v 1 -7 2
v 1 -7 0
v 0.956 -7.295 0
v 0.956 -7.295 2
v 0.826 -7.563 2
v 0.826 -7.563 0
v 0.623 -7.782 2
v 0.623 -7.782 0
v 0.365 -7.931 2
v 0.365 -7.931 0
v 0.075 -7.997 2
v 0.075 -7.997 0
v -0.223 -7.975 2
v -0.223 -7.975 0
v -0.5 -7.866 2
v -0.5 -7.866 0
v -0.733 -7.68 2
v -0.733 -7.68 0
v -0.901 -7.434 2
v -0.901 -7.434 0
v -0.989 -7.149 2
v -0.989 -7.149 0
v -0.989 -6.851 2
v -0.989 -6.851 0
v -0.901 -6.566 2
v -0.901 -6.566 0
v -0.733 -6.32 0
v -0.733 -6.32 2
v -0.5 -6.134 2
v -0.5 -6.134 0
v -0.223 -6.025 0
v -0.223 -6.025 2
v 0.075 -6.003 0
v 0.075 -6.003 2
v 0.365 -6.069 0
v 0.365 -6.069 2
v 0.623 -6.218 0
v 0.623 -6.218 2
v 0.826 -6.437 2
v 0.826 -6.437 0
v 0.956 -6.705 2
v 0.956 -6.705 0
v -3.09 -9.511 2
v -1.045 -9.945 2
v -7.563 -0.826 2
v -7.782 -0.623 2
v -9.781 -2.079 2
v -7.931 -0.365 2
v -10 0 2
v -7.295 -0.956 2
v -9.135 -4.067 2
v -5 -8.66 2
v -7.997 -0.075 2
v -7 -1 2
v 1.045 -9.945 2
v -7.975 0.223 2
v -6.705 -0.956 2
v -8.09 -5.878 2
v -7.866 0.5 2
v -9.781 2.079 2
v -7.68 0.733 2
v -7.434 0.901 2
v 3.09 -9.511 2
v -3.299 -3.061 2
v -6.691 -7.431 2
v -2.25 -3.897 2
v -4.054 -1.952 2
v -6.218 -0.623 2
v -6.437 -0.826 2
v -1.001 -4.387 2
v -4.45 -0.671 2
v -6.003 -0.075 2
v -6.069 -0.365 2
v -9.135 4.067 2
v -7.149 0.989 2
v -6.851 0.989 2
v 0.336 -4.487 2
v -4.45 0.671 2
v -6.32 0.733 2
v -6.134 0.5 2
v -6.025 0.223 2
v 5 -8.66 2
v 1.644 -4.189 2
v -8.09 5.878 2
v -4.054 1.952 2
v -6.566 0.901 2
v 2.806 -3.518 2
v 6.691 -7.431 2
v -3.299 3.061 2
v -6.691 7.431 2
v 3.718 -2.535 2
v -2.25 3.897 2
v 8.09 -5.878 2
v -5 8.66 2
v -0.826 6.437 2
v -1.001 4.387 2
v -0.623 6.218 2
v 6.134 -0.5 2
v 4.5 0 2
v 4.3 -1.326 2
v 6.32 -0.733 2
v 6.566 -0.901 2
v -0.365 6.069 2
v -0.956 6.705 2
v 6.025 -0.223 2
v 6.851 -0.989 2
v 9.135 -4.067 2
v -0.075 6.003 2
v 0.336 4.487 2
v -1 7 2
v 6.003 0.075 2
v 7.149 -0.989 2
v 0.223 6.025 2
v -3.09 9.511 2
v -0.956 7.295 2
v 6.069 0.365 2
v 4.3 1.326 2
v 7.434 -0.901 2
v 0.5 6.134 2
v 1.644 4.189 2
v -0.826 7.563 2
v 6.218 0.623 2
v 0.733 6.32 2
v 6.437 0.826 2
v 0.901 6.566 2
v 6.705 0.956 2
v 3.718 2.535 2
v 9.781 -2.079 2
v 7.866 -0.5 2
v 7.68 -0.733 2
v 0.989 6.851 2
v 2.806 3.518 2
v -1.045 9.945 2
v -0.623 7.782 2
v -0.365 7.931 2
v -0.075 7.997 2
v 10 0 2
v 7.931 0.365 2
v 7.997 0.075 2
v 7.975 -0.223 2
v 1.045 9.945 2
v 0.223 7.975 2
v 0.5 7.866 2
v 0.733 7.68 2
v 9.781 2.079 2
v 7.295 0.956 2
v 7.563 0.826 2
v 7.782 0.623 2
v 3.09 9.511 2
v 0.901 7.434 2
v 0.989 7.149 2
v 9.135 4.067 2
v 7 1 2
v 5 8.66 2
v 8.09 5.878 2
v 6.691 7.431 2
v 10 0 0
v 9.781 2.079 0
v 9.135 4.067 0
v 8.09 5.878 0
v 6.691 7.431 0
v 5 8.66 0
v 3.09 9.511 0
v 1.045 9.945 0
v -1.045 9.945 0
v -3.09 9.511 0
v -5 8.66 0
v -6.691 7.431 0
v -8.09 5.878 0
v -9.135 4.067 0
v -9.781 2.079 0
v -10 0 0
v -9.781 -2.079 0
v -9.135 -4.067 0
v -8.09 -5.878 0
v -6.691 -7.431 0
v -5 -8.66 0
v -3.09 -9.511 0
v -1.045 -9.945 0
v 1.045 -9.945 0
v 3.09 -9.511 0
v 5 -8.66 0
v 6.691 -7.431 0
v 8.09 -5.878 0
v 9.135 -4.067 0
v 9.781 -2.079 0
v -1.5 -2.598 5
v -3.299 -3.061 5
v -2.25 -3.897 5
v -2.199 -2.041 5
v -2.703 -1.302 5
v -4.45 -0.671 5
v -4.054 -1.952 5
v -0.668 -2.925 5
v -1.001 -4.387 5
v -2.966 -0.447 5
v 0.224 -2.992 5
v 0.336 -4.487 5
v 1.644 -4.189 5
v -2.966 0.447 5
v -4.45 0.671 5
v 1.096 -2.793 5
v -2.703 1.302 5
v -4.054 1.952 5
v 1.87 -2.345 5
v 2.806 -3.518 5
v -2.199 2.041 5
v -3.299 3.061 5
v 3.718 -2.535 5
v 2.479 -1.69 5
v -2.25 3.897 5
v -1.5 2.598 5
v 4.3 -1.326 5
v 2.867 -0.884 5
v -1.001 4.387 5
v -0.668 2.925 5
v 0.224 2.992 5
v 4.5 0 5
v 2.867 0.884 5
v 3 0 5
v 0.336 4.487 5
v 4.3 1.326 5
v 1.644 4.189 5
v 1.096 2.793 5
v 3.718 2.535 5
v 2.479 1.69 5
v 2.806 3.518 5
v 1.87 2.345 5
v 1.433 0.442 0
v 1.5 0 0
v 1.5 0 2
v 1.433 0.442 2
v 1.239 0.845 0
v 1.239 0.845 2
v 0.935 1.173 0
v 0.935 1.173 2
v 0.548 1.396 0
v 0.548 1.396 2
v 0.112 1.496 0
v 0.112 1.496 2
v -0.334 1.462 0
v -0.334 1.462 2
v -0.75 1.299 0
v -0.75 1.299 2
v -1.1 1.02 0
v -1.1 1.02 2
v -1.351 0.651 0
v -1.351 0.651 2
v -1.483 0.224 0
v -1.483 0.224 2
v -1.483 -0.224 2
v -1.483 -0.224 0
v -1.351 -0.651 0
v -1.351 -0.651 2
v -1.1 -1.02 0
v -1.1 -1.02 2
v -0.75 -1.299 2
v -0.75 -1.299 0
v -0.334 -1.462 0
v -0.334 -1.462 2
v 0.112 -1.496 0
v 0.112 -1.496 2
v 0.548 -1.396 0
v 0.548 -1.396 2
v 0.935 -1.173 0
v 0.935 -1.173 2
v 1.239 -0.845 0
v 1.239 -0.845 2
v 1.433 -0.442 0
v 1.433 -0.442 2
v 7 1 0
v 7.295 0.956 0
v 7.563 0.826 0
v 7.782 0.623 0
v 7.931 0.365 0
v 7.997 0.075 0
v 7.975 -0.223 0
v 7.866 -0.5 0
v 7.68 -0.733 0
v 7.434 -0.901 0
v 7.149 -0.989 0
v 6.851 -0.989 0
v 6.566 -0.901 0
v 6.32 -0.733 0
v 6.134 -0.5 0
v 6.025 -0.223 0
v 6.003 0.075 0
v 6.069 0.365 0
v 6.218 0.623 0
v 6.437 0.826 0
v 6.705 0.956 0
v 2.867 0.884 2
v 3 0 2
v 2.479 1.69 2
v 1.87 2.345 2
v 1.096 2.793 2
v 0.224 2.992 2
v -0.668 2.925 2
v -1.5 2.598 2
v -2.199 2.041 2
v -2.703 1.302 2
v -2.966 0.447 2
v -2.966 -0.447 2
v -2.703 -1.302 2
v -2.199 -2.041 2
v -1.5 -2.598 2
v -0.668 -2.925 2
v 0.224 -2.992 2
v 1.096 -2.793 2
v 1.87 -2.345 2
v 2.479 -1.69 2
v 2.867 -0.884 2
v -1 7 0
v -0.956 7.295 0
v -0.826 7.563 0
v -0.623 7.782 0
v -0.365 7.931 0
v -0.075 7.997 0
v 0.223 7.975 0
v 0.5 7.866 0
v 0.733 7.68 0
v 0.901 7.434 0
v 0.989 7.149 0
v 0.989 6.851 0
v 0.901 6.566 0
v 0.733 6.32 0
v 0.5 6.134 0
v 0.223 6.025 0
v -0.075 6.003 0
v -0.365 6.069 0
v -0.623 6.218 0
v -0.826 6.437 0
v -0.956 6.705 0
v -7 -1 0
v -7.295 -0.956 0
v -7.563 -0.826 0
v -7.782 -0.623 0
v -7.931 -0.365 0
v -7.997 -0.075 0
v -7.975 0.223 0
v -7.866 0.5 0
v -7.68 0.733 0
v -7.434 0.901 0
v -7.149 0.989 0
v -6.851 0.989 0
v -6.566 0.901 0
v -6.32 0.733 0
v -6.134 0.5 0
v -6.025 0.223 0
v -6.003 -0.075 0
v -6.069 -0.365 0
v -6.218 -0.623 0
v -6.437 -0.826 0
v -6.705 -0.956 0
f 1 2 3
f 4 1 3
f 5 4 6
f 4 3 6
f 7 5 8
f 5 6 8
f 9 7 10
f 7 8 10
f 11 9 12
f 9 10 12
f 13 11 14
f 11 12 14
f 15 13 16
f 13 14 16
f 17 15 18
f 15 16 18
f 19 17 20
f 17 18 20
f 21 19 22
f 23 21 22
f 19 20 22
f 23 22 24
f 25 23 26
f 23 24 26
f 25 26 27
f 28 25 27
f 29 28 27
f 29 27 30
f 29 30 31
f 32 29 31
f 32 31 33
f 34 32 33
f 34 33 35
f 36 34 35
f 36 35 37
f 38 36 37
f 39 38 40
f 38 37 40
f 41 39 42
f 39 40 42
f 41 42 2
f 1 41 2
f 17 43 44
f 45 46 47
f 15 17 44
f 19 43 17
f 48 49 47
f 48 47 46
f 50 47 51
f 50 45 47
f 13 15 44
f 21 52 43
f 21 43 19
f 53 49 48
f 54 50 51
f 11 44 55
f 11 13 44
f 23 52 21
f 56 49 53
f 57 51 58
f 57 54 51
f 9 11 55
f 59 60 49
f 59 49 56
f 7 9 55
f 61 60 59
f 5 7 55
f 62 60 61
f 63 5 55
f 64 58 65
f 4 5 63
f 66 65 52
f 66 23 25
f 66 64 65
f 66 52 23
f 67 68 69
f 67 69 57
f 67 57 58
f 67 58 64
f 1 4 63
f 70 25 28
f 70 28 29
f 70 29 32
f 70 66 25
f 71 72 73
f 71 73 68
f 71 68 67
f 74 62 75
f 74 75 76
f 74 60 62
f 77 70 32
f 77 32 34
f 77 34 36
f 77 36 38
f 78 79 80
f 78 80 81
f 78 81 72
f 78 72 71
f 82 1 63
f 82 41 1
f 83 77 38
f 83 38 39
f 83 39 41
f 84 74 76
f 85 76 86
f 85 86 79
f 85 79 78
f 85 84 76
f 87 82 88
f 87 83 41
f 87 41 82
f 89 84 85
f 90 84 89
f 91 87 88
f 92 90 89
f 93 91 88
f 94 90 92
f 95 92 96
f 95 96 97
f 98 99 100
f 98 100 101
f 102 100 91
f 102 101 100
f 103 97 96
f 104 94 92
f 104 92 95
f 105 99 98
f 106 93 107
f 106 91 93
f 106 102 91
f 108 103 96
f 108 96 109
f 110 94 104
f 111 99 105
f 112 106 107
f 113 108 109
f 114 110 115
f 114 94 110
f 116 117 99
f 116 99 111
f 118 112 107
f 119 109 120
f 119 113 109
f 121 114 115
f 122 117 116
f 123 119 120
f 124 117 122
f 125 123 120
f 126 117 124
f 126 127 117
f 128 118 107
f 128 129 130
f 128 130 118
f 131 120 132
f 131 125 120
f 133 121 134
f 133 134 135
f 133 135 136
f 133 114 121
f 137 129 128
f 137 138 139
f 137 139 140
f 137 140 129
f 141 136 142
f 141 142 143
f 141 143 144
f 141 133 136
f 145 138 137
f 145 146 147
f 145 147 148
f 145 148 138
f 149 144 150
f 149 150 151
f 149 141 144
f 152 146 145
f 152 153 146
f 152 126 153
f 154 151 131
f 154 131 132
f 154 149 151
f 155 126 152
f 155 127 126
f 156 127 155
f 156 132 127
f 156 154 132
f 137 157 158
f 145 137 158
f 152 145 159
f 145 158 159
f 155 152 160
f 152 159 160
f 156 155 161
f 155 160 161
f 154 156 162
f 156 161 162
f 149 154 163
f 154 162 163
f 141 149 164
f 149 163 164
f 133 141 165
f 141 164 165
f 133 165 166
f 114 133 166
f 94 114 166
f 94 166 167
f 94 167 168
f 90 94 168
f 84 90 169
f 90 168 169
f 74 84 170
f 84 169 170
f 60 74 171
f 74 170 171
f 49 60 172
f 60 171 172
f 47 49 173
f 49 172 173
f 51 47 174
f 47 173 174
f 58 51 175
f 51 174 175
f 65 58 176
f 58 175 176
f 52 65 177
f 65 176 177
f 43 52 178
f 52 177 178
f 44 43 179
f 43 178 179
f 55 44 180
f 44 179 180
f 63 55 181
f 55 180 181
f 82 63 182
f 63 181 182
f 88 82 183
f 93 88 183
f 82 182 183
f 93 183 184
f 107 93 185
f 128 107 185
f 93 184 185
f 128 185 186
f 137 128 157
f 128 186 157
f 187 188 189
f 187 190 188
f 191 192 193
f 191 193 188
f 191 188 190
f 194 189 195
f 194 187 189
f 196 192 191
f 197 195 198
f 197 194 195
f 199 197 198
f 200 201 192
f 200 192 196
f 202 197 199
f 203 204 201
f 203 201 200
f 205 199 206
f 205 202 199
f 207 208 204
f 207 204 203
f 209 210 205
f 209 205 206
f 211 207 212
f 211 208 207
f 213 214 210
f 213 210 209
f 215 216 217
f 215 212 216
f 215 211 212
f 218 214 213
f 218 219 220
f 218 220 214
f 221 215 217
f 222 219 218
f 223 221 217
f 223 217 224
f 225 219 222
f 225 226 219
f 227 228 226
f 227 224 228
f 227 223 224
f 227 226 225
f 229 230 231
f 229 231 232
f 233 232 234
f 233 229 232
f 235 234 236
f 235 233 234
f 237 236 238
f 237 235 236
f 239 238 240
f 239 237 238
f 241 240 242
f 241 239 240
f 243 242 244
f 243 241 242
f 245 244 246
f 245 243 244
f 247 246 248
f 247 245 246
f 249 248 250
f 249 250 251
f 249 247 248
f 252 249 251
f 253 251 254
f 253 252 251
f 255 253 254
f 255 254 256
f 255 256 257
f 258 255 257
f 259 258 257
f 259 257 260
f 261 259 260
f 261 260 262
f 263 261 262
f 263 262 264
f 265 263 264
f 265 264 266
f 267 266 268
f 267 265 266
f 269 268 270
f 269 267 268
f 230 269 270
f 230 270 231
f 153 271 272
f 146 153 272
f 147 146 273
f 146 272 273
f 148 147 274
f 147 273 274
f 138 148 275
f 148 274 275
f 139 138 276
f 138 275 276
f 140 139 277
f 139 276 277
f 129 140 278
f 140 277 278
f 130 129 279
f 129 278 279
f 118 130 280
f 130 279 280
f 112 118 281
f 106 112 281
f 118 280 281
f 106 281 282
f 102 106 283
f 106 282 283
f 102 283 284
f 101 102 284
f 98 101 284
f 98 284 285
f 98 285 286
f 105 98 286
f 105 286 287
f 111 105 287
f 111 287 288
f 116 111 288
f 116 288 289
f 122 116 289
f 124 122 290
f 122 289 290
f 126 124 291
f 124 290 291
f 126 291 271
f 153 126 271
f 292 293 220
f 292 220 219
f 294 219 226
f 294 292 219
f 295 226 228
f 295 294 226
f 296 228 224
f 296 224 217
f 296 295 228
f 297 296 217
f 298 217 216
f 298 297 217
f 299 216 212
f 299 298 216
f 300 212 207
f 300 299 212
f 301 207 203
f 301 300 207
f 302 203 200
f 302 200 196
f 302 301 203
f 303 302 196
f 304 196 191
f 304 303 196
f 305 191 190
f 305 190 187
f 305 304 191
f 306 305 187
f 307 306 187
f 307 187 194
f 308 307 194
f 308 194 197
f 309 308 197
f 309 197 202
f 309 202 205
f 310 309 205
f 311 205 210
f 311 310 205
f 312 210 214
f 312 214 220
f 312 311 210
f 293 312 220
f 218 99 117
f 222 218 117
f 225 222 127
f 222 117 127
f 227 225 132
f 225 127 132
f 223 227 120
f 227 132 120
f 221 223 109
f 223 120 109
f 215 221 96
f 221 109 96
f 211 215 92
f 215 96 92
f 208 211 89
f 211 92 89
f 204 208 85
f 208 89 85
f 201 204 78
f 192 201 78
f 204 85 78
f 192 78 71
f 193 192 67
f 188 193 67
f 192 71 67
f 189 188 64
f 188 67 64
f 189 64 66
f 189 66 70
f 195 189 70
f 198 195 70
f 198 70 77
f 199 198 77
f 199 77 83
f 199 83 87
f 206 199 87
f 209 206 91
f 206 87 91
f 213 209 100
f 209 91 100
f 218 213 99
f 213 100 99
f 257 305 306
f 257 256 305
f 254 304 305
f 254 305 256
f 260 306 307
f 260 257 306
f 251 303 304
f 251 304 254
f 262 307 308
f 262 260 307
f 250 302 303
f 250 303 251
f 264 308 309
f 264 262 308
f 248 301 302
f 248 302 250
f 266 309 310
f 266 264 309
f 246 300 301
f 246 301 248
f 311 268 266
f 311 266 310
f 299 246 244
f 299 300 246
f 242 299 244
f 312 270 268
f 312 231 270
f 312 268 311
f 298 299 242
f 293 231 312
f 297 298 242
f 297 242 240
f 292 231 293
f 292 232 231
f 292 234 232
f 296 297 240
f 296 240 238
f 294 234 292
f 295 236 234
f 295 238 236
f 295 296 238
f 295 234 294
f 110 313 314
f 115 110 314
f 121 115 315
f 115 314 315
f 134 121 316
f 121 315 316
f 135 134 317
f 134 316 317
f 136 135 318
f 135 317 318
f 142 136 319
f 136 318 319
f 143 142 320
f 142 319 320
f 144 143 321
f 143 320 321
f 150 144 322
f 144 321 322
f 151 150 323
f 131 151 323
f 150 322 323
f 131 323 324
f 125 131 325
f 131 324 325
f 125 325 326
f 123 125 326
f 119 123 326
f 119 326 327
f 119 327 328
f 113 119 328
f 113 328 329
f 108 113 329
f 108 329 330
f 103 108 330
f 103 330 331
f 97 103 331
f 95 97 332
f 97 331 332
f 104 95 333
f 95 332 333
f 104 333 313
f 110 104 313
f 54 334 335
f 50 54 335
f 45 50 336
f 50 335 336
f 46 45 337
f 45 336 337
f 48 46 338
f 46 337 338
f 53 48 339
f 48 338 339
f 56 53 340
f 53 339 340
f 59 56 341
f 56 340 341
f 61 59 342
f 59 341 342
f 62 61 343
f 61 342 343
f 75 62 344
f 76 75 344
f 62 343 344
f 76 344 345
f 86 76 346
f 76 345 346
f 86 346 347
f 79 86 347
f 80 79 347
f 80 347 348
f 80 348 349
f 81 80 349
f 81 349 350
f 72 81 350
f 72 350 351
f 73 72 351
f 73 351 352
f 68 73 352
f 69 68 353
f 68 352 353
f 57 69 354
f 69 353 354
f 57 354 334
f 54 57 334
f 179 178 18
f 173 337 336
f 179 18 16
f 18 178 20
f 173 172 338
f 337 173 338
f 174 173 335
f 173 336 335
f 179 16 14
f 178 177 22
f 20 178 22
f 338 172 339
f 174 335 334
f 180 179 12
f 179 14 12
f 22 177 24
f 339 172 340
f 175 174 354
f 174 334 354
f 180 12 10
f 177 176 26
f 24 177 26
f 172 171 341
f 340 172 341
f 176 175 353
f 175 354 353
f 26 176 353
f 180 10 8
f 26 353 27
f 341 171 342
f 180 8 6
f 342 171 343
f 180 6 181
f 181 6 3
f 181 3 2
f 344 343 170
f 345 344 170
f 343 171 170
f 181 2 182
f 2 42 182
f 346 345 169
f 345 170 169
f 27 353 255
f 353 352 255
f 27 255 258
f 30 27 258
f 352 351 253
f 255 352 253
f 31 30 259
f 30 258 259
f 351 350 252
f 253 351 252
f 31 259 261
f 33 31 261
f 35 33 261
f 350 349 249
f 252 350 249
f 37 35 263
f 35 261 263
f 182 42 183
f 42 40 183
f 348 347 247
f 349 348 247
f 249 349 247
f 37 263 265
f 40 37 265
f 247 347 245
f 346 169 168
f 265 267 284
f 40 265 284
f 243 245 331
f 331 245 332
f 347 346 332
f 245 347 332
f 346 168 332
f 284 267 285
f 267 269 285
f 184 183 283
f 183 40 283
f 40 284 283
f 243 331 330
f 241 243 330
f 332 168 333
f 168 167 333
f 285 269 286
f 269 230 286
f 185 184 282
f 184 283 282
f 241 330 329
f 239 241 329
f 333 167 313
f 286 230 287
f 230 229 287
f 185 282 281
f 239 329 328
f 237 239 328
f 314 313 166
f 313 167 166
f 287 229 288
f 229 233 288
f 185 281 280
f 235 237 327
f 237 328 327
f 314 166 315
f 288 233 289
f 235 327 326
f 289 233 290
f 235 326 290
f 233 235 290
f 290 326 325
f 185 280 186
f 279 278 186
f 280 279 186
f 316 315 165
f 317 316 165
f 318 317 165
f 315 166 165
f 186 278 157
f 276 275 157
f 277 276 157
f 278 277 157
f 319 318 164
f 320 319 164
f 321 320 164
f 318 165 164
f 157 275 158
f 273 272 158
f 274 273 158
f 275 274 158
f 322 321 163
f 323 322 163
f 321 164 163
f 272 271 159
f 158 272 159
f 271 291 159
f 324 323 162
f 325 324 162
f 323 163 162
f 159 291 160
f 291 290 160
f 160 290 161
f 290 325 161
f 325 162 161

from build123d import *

# Parameters (mm, degrees)
SKETCH1_R           = 10
SKETCH1_R_2         = 1.5
BOSS_EXTRUDE1_DEPTH = 2
SKETCH2_R           = 4.5
SKETCH2_R_2         = 3
BOSS_EXTRUDE2_DEPTH = 3
SKETCH3_R           = 1
CUT_EXTRUDE1_DEPTH  = 2
CIRPATTERN1_COUNT   = 4


with BuildPart() as part:
    # Sketch1 → Boss-Extrude1 (new body)
    with BuildSketch(Plane.XY):
        Circle(SKETCH1_R)
        Circle(SKETCH1_R_2, mode=Mode.SUBTRACT)
    extrude(amount=BOSS_EXTRUDE1_DEPTH)

    # Sketch2 → Boss-Extrude2 (add)
    with BuildSketch(Plane.XY.offset(2)):
        Circle(SKETCH2_R)
        Circle(SKETCH2_R_2, mode=Mode.SUBTRACT)
    extrude(amount=BOSS_EXTRUDE2_DEPTH)

    # Sketch3 → Cut-Extrude1 (cut)
    with BuildSketch(Plane(origin=(0, 0, 0), x_dir=(-1, 0, 0), z_dir=(0, 0, -1))):
        with Locations((0, 7)):
            Circle(SKETCH3_R)
    cut_extrude1 = extrude(amount=-CUT_EXTRUDE1_DEPTH, mode=Mode.SUBTRACT)

    # CirPattern1: Cut-Extrude1 ×4 about axis
    cirpattern1_axis = Axis((0, 0, 0), (0, 0, 1))
    for i in range(1, CIRPATTERN1_COUNT):
        add(cut_extrude1.rotate(cirpattern1_axis, i * 360 / CIRPATTERN1_COUNT), mode=Mode.SUBTRACT)


solid = part.part
